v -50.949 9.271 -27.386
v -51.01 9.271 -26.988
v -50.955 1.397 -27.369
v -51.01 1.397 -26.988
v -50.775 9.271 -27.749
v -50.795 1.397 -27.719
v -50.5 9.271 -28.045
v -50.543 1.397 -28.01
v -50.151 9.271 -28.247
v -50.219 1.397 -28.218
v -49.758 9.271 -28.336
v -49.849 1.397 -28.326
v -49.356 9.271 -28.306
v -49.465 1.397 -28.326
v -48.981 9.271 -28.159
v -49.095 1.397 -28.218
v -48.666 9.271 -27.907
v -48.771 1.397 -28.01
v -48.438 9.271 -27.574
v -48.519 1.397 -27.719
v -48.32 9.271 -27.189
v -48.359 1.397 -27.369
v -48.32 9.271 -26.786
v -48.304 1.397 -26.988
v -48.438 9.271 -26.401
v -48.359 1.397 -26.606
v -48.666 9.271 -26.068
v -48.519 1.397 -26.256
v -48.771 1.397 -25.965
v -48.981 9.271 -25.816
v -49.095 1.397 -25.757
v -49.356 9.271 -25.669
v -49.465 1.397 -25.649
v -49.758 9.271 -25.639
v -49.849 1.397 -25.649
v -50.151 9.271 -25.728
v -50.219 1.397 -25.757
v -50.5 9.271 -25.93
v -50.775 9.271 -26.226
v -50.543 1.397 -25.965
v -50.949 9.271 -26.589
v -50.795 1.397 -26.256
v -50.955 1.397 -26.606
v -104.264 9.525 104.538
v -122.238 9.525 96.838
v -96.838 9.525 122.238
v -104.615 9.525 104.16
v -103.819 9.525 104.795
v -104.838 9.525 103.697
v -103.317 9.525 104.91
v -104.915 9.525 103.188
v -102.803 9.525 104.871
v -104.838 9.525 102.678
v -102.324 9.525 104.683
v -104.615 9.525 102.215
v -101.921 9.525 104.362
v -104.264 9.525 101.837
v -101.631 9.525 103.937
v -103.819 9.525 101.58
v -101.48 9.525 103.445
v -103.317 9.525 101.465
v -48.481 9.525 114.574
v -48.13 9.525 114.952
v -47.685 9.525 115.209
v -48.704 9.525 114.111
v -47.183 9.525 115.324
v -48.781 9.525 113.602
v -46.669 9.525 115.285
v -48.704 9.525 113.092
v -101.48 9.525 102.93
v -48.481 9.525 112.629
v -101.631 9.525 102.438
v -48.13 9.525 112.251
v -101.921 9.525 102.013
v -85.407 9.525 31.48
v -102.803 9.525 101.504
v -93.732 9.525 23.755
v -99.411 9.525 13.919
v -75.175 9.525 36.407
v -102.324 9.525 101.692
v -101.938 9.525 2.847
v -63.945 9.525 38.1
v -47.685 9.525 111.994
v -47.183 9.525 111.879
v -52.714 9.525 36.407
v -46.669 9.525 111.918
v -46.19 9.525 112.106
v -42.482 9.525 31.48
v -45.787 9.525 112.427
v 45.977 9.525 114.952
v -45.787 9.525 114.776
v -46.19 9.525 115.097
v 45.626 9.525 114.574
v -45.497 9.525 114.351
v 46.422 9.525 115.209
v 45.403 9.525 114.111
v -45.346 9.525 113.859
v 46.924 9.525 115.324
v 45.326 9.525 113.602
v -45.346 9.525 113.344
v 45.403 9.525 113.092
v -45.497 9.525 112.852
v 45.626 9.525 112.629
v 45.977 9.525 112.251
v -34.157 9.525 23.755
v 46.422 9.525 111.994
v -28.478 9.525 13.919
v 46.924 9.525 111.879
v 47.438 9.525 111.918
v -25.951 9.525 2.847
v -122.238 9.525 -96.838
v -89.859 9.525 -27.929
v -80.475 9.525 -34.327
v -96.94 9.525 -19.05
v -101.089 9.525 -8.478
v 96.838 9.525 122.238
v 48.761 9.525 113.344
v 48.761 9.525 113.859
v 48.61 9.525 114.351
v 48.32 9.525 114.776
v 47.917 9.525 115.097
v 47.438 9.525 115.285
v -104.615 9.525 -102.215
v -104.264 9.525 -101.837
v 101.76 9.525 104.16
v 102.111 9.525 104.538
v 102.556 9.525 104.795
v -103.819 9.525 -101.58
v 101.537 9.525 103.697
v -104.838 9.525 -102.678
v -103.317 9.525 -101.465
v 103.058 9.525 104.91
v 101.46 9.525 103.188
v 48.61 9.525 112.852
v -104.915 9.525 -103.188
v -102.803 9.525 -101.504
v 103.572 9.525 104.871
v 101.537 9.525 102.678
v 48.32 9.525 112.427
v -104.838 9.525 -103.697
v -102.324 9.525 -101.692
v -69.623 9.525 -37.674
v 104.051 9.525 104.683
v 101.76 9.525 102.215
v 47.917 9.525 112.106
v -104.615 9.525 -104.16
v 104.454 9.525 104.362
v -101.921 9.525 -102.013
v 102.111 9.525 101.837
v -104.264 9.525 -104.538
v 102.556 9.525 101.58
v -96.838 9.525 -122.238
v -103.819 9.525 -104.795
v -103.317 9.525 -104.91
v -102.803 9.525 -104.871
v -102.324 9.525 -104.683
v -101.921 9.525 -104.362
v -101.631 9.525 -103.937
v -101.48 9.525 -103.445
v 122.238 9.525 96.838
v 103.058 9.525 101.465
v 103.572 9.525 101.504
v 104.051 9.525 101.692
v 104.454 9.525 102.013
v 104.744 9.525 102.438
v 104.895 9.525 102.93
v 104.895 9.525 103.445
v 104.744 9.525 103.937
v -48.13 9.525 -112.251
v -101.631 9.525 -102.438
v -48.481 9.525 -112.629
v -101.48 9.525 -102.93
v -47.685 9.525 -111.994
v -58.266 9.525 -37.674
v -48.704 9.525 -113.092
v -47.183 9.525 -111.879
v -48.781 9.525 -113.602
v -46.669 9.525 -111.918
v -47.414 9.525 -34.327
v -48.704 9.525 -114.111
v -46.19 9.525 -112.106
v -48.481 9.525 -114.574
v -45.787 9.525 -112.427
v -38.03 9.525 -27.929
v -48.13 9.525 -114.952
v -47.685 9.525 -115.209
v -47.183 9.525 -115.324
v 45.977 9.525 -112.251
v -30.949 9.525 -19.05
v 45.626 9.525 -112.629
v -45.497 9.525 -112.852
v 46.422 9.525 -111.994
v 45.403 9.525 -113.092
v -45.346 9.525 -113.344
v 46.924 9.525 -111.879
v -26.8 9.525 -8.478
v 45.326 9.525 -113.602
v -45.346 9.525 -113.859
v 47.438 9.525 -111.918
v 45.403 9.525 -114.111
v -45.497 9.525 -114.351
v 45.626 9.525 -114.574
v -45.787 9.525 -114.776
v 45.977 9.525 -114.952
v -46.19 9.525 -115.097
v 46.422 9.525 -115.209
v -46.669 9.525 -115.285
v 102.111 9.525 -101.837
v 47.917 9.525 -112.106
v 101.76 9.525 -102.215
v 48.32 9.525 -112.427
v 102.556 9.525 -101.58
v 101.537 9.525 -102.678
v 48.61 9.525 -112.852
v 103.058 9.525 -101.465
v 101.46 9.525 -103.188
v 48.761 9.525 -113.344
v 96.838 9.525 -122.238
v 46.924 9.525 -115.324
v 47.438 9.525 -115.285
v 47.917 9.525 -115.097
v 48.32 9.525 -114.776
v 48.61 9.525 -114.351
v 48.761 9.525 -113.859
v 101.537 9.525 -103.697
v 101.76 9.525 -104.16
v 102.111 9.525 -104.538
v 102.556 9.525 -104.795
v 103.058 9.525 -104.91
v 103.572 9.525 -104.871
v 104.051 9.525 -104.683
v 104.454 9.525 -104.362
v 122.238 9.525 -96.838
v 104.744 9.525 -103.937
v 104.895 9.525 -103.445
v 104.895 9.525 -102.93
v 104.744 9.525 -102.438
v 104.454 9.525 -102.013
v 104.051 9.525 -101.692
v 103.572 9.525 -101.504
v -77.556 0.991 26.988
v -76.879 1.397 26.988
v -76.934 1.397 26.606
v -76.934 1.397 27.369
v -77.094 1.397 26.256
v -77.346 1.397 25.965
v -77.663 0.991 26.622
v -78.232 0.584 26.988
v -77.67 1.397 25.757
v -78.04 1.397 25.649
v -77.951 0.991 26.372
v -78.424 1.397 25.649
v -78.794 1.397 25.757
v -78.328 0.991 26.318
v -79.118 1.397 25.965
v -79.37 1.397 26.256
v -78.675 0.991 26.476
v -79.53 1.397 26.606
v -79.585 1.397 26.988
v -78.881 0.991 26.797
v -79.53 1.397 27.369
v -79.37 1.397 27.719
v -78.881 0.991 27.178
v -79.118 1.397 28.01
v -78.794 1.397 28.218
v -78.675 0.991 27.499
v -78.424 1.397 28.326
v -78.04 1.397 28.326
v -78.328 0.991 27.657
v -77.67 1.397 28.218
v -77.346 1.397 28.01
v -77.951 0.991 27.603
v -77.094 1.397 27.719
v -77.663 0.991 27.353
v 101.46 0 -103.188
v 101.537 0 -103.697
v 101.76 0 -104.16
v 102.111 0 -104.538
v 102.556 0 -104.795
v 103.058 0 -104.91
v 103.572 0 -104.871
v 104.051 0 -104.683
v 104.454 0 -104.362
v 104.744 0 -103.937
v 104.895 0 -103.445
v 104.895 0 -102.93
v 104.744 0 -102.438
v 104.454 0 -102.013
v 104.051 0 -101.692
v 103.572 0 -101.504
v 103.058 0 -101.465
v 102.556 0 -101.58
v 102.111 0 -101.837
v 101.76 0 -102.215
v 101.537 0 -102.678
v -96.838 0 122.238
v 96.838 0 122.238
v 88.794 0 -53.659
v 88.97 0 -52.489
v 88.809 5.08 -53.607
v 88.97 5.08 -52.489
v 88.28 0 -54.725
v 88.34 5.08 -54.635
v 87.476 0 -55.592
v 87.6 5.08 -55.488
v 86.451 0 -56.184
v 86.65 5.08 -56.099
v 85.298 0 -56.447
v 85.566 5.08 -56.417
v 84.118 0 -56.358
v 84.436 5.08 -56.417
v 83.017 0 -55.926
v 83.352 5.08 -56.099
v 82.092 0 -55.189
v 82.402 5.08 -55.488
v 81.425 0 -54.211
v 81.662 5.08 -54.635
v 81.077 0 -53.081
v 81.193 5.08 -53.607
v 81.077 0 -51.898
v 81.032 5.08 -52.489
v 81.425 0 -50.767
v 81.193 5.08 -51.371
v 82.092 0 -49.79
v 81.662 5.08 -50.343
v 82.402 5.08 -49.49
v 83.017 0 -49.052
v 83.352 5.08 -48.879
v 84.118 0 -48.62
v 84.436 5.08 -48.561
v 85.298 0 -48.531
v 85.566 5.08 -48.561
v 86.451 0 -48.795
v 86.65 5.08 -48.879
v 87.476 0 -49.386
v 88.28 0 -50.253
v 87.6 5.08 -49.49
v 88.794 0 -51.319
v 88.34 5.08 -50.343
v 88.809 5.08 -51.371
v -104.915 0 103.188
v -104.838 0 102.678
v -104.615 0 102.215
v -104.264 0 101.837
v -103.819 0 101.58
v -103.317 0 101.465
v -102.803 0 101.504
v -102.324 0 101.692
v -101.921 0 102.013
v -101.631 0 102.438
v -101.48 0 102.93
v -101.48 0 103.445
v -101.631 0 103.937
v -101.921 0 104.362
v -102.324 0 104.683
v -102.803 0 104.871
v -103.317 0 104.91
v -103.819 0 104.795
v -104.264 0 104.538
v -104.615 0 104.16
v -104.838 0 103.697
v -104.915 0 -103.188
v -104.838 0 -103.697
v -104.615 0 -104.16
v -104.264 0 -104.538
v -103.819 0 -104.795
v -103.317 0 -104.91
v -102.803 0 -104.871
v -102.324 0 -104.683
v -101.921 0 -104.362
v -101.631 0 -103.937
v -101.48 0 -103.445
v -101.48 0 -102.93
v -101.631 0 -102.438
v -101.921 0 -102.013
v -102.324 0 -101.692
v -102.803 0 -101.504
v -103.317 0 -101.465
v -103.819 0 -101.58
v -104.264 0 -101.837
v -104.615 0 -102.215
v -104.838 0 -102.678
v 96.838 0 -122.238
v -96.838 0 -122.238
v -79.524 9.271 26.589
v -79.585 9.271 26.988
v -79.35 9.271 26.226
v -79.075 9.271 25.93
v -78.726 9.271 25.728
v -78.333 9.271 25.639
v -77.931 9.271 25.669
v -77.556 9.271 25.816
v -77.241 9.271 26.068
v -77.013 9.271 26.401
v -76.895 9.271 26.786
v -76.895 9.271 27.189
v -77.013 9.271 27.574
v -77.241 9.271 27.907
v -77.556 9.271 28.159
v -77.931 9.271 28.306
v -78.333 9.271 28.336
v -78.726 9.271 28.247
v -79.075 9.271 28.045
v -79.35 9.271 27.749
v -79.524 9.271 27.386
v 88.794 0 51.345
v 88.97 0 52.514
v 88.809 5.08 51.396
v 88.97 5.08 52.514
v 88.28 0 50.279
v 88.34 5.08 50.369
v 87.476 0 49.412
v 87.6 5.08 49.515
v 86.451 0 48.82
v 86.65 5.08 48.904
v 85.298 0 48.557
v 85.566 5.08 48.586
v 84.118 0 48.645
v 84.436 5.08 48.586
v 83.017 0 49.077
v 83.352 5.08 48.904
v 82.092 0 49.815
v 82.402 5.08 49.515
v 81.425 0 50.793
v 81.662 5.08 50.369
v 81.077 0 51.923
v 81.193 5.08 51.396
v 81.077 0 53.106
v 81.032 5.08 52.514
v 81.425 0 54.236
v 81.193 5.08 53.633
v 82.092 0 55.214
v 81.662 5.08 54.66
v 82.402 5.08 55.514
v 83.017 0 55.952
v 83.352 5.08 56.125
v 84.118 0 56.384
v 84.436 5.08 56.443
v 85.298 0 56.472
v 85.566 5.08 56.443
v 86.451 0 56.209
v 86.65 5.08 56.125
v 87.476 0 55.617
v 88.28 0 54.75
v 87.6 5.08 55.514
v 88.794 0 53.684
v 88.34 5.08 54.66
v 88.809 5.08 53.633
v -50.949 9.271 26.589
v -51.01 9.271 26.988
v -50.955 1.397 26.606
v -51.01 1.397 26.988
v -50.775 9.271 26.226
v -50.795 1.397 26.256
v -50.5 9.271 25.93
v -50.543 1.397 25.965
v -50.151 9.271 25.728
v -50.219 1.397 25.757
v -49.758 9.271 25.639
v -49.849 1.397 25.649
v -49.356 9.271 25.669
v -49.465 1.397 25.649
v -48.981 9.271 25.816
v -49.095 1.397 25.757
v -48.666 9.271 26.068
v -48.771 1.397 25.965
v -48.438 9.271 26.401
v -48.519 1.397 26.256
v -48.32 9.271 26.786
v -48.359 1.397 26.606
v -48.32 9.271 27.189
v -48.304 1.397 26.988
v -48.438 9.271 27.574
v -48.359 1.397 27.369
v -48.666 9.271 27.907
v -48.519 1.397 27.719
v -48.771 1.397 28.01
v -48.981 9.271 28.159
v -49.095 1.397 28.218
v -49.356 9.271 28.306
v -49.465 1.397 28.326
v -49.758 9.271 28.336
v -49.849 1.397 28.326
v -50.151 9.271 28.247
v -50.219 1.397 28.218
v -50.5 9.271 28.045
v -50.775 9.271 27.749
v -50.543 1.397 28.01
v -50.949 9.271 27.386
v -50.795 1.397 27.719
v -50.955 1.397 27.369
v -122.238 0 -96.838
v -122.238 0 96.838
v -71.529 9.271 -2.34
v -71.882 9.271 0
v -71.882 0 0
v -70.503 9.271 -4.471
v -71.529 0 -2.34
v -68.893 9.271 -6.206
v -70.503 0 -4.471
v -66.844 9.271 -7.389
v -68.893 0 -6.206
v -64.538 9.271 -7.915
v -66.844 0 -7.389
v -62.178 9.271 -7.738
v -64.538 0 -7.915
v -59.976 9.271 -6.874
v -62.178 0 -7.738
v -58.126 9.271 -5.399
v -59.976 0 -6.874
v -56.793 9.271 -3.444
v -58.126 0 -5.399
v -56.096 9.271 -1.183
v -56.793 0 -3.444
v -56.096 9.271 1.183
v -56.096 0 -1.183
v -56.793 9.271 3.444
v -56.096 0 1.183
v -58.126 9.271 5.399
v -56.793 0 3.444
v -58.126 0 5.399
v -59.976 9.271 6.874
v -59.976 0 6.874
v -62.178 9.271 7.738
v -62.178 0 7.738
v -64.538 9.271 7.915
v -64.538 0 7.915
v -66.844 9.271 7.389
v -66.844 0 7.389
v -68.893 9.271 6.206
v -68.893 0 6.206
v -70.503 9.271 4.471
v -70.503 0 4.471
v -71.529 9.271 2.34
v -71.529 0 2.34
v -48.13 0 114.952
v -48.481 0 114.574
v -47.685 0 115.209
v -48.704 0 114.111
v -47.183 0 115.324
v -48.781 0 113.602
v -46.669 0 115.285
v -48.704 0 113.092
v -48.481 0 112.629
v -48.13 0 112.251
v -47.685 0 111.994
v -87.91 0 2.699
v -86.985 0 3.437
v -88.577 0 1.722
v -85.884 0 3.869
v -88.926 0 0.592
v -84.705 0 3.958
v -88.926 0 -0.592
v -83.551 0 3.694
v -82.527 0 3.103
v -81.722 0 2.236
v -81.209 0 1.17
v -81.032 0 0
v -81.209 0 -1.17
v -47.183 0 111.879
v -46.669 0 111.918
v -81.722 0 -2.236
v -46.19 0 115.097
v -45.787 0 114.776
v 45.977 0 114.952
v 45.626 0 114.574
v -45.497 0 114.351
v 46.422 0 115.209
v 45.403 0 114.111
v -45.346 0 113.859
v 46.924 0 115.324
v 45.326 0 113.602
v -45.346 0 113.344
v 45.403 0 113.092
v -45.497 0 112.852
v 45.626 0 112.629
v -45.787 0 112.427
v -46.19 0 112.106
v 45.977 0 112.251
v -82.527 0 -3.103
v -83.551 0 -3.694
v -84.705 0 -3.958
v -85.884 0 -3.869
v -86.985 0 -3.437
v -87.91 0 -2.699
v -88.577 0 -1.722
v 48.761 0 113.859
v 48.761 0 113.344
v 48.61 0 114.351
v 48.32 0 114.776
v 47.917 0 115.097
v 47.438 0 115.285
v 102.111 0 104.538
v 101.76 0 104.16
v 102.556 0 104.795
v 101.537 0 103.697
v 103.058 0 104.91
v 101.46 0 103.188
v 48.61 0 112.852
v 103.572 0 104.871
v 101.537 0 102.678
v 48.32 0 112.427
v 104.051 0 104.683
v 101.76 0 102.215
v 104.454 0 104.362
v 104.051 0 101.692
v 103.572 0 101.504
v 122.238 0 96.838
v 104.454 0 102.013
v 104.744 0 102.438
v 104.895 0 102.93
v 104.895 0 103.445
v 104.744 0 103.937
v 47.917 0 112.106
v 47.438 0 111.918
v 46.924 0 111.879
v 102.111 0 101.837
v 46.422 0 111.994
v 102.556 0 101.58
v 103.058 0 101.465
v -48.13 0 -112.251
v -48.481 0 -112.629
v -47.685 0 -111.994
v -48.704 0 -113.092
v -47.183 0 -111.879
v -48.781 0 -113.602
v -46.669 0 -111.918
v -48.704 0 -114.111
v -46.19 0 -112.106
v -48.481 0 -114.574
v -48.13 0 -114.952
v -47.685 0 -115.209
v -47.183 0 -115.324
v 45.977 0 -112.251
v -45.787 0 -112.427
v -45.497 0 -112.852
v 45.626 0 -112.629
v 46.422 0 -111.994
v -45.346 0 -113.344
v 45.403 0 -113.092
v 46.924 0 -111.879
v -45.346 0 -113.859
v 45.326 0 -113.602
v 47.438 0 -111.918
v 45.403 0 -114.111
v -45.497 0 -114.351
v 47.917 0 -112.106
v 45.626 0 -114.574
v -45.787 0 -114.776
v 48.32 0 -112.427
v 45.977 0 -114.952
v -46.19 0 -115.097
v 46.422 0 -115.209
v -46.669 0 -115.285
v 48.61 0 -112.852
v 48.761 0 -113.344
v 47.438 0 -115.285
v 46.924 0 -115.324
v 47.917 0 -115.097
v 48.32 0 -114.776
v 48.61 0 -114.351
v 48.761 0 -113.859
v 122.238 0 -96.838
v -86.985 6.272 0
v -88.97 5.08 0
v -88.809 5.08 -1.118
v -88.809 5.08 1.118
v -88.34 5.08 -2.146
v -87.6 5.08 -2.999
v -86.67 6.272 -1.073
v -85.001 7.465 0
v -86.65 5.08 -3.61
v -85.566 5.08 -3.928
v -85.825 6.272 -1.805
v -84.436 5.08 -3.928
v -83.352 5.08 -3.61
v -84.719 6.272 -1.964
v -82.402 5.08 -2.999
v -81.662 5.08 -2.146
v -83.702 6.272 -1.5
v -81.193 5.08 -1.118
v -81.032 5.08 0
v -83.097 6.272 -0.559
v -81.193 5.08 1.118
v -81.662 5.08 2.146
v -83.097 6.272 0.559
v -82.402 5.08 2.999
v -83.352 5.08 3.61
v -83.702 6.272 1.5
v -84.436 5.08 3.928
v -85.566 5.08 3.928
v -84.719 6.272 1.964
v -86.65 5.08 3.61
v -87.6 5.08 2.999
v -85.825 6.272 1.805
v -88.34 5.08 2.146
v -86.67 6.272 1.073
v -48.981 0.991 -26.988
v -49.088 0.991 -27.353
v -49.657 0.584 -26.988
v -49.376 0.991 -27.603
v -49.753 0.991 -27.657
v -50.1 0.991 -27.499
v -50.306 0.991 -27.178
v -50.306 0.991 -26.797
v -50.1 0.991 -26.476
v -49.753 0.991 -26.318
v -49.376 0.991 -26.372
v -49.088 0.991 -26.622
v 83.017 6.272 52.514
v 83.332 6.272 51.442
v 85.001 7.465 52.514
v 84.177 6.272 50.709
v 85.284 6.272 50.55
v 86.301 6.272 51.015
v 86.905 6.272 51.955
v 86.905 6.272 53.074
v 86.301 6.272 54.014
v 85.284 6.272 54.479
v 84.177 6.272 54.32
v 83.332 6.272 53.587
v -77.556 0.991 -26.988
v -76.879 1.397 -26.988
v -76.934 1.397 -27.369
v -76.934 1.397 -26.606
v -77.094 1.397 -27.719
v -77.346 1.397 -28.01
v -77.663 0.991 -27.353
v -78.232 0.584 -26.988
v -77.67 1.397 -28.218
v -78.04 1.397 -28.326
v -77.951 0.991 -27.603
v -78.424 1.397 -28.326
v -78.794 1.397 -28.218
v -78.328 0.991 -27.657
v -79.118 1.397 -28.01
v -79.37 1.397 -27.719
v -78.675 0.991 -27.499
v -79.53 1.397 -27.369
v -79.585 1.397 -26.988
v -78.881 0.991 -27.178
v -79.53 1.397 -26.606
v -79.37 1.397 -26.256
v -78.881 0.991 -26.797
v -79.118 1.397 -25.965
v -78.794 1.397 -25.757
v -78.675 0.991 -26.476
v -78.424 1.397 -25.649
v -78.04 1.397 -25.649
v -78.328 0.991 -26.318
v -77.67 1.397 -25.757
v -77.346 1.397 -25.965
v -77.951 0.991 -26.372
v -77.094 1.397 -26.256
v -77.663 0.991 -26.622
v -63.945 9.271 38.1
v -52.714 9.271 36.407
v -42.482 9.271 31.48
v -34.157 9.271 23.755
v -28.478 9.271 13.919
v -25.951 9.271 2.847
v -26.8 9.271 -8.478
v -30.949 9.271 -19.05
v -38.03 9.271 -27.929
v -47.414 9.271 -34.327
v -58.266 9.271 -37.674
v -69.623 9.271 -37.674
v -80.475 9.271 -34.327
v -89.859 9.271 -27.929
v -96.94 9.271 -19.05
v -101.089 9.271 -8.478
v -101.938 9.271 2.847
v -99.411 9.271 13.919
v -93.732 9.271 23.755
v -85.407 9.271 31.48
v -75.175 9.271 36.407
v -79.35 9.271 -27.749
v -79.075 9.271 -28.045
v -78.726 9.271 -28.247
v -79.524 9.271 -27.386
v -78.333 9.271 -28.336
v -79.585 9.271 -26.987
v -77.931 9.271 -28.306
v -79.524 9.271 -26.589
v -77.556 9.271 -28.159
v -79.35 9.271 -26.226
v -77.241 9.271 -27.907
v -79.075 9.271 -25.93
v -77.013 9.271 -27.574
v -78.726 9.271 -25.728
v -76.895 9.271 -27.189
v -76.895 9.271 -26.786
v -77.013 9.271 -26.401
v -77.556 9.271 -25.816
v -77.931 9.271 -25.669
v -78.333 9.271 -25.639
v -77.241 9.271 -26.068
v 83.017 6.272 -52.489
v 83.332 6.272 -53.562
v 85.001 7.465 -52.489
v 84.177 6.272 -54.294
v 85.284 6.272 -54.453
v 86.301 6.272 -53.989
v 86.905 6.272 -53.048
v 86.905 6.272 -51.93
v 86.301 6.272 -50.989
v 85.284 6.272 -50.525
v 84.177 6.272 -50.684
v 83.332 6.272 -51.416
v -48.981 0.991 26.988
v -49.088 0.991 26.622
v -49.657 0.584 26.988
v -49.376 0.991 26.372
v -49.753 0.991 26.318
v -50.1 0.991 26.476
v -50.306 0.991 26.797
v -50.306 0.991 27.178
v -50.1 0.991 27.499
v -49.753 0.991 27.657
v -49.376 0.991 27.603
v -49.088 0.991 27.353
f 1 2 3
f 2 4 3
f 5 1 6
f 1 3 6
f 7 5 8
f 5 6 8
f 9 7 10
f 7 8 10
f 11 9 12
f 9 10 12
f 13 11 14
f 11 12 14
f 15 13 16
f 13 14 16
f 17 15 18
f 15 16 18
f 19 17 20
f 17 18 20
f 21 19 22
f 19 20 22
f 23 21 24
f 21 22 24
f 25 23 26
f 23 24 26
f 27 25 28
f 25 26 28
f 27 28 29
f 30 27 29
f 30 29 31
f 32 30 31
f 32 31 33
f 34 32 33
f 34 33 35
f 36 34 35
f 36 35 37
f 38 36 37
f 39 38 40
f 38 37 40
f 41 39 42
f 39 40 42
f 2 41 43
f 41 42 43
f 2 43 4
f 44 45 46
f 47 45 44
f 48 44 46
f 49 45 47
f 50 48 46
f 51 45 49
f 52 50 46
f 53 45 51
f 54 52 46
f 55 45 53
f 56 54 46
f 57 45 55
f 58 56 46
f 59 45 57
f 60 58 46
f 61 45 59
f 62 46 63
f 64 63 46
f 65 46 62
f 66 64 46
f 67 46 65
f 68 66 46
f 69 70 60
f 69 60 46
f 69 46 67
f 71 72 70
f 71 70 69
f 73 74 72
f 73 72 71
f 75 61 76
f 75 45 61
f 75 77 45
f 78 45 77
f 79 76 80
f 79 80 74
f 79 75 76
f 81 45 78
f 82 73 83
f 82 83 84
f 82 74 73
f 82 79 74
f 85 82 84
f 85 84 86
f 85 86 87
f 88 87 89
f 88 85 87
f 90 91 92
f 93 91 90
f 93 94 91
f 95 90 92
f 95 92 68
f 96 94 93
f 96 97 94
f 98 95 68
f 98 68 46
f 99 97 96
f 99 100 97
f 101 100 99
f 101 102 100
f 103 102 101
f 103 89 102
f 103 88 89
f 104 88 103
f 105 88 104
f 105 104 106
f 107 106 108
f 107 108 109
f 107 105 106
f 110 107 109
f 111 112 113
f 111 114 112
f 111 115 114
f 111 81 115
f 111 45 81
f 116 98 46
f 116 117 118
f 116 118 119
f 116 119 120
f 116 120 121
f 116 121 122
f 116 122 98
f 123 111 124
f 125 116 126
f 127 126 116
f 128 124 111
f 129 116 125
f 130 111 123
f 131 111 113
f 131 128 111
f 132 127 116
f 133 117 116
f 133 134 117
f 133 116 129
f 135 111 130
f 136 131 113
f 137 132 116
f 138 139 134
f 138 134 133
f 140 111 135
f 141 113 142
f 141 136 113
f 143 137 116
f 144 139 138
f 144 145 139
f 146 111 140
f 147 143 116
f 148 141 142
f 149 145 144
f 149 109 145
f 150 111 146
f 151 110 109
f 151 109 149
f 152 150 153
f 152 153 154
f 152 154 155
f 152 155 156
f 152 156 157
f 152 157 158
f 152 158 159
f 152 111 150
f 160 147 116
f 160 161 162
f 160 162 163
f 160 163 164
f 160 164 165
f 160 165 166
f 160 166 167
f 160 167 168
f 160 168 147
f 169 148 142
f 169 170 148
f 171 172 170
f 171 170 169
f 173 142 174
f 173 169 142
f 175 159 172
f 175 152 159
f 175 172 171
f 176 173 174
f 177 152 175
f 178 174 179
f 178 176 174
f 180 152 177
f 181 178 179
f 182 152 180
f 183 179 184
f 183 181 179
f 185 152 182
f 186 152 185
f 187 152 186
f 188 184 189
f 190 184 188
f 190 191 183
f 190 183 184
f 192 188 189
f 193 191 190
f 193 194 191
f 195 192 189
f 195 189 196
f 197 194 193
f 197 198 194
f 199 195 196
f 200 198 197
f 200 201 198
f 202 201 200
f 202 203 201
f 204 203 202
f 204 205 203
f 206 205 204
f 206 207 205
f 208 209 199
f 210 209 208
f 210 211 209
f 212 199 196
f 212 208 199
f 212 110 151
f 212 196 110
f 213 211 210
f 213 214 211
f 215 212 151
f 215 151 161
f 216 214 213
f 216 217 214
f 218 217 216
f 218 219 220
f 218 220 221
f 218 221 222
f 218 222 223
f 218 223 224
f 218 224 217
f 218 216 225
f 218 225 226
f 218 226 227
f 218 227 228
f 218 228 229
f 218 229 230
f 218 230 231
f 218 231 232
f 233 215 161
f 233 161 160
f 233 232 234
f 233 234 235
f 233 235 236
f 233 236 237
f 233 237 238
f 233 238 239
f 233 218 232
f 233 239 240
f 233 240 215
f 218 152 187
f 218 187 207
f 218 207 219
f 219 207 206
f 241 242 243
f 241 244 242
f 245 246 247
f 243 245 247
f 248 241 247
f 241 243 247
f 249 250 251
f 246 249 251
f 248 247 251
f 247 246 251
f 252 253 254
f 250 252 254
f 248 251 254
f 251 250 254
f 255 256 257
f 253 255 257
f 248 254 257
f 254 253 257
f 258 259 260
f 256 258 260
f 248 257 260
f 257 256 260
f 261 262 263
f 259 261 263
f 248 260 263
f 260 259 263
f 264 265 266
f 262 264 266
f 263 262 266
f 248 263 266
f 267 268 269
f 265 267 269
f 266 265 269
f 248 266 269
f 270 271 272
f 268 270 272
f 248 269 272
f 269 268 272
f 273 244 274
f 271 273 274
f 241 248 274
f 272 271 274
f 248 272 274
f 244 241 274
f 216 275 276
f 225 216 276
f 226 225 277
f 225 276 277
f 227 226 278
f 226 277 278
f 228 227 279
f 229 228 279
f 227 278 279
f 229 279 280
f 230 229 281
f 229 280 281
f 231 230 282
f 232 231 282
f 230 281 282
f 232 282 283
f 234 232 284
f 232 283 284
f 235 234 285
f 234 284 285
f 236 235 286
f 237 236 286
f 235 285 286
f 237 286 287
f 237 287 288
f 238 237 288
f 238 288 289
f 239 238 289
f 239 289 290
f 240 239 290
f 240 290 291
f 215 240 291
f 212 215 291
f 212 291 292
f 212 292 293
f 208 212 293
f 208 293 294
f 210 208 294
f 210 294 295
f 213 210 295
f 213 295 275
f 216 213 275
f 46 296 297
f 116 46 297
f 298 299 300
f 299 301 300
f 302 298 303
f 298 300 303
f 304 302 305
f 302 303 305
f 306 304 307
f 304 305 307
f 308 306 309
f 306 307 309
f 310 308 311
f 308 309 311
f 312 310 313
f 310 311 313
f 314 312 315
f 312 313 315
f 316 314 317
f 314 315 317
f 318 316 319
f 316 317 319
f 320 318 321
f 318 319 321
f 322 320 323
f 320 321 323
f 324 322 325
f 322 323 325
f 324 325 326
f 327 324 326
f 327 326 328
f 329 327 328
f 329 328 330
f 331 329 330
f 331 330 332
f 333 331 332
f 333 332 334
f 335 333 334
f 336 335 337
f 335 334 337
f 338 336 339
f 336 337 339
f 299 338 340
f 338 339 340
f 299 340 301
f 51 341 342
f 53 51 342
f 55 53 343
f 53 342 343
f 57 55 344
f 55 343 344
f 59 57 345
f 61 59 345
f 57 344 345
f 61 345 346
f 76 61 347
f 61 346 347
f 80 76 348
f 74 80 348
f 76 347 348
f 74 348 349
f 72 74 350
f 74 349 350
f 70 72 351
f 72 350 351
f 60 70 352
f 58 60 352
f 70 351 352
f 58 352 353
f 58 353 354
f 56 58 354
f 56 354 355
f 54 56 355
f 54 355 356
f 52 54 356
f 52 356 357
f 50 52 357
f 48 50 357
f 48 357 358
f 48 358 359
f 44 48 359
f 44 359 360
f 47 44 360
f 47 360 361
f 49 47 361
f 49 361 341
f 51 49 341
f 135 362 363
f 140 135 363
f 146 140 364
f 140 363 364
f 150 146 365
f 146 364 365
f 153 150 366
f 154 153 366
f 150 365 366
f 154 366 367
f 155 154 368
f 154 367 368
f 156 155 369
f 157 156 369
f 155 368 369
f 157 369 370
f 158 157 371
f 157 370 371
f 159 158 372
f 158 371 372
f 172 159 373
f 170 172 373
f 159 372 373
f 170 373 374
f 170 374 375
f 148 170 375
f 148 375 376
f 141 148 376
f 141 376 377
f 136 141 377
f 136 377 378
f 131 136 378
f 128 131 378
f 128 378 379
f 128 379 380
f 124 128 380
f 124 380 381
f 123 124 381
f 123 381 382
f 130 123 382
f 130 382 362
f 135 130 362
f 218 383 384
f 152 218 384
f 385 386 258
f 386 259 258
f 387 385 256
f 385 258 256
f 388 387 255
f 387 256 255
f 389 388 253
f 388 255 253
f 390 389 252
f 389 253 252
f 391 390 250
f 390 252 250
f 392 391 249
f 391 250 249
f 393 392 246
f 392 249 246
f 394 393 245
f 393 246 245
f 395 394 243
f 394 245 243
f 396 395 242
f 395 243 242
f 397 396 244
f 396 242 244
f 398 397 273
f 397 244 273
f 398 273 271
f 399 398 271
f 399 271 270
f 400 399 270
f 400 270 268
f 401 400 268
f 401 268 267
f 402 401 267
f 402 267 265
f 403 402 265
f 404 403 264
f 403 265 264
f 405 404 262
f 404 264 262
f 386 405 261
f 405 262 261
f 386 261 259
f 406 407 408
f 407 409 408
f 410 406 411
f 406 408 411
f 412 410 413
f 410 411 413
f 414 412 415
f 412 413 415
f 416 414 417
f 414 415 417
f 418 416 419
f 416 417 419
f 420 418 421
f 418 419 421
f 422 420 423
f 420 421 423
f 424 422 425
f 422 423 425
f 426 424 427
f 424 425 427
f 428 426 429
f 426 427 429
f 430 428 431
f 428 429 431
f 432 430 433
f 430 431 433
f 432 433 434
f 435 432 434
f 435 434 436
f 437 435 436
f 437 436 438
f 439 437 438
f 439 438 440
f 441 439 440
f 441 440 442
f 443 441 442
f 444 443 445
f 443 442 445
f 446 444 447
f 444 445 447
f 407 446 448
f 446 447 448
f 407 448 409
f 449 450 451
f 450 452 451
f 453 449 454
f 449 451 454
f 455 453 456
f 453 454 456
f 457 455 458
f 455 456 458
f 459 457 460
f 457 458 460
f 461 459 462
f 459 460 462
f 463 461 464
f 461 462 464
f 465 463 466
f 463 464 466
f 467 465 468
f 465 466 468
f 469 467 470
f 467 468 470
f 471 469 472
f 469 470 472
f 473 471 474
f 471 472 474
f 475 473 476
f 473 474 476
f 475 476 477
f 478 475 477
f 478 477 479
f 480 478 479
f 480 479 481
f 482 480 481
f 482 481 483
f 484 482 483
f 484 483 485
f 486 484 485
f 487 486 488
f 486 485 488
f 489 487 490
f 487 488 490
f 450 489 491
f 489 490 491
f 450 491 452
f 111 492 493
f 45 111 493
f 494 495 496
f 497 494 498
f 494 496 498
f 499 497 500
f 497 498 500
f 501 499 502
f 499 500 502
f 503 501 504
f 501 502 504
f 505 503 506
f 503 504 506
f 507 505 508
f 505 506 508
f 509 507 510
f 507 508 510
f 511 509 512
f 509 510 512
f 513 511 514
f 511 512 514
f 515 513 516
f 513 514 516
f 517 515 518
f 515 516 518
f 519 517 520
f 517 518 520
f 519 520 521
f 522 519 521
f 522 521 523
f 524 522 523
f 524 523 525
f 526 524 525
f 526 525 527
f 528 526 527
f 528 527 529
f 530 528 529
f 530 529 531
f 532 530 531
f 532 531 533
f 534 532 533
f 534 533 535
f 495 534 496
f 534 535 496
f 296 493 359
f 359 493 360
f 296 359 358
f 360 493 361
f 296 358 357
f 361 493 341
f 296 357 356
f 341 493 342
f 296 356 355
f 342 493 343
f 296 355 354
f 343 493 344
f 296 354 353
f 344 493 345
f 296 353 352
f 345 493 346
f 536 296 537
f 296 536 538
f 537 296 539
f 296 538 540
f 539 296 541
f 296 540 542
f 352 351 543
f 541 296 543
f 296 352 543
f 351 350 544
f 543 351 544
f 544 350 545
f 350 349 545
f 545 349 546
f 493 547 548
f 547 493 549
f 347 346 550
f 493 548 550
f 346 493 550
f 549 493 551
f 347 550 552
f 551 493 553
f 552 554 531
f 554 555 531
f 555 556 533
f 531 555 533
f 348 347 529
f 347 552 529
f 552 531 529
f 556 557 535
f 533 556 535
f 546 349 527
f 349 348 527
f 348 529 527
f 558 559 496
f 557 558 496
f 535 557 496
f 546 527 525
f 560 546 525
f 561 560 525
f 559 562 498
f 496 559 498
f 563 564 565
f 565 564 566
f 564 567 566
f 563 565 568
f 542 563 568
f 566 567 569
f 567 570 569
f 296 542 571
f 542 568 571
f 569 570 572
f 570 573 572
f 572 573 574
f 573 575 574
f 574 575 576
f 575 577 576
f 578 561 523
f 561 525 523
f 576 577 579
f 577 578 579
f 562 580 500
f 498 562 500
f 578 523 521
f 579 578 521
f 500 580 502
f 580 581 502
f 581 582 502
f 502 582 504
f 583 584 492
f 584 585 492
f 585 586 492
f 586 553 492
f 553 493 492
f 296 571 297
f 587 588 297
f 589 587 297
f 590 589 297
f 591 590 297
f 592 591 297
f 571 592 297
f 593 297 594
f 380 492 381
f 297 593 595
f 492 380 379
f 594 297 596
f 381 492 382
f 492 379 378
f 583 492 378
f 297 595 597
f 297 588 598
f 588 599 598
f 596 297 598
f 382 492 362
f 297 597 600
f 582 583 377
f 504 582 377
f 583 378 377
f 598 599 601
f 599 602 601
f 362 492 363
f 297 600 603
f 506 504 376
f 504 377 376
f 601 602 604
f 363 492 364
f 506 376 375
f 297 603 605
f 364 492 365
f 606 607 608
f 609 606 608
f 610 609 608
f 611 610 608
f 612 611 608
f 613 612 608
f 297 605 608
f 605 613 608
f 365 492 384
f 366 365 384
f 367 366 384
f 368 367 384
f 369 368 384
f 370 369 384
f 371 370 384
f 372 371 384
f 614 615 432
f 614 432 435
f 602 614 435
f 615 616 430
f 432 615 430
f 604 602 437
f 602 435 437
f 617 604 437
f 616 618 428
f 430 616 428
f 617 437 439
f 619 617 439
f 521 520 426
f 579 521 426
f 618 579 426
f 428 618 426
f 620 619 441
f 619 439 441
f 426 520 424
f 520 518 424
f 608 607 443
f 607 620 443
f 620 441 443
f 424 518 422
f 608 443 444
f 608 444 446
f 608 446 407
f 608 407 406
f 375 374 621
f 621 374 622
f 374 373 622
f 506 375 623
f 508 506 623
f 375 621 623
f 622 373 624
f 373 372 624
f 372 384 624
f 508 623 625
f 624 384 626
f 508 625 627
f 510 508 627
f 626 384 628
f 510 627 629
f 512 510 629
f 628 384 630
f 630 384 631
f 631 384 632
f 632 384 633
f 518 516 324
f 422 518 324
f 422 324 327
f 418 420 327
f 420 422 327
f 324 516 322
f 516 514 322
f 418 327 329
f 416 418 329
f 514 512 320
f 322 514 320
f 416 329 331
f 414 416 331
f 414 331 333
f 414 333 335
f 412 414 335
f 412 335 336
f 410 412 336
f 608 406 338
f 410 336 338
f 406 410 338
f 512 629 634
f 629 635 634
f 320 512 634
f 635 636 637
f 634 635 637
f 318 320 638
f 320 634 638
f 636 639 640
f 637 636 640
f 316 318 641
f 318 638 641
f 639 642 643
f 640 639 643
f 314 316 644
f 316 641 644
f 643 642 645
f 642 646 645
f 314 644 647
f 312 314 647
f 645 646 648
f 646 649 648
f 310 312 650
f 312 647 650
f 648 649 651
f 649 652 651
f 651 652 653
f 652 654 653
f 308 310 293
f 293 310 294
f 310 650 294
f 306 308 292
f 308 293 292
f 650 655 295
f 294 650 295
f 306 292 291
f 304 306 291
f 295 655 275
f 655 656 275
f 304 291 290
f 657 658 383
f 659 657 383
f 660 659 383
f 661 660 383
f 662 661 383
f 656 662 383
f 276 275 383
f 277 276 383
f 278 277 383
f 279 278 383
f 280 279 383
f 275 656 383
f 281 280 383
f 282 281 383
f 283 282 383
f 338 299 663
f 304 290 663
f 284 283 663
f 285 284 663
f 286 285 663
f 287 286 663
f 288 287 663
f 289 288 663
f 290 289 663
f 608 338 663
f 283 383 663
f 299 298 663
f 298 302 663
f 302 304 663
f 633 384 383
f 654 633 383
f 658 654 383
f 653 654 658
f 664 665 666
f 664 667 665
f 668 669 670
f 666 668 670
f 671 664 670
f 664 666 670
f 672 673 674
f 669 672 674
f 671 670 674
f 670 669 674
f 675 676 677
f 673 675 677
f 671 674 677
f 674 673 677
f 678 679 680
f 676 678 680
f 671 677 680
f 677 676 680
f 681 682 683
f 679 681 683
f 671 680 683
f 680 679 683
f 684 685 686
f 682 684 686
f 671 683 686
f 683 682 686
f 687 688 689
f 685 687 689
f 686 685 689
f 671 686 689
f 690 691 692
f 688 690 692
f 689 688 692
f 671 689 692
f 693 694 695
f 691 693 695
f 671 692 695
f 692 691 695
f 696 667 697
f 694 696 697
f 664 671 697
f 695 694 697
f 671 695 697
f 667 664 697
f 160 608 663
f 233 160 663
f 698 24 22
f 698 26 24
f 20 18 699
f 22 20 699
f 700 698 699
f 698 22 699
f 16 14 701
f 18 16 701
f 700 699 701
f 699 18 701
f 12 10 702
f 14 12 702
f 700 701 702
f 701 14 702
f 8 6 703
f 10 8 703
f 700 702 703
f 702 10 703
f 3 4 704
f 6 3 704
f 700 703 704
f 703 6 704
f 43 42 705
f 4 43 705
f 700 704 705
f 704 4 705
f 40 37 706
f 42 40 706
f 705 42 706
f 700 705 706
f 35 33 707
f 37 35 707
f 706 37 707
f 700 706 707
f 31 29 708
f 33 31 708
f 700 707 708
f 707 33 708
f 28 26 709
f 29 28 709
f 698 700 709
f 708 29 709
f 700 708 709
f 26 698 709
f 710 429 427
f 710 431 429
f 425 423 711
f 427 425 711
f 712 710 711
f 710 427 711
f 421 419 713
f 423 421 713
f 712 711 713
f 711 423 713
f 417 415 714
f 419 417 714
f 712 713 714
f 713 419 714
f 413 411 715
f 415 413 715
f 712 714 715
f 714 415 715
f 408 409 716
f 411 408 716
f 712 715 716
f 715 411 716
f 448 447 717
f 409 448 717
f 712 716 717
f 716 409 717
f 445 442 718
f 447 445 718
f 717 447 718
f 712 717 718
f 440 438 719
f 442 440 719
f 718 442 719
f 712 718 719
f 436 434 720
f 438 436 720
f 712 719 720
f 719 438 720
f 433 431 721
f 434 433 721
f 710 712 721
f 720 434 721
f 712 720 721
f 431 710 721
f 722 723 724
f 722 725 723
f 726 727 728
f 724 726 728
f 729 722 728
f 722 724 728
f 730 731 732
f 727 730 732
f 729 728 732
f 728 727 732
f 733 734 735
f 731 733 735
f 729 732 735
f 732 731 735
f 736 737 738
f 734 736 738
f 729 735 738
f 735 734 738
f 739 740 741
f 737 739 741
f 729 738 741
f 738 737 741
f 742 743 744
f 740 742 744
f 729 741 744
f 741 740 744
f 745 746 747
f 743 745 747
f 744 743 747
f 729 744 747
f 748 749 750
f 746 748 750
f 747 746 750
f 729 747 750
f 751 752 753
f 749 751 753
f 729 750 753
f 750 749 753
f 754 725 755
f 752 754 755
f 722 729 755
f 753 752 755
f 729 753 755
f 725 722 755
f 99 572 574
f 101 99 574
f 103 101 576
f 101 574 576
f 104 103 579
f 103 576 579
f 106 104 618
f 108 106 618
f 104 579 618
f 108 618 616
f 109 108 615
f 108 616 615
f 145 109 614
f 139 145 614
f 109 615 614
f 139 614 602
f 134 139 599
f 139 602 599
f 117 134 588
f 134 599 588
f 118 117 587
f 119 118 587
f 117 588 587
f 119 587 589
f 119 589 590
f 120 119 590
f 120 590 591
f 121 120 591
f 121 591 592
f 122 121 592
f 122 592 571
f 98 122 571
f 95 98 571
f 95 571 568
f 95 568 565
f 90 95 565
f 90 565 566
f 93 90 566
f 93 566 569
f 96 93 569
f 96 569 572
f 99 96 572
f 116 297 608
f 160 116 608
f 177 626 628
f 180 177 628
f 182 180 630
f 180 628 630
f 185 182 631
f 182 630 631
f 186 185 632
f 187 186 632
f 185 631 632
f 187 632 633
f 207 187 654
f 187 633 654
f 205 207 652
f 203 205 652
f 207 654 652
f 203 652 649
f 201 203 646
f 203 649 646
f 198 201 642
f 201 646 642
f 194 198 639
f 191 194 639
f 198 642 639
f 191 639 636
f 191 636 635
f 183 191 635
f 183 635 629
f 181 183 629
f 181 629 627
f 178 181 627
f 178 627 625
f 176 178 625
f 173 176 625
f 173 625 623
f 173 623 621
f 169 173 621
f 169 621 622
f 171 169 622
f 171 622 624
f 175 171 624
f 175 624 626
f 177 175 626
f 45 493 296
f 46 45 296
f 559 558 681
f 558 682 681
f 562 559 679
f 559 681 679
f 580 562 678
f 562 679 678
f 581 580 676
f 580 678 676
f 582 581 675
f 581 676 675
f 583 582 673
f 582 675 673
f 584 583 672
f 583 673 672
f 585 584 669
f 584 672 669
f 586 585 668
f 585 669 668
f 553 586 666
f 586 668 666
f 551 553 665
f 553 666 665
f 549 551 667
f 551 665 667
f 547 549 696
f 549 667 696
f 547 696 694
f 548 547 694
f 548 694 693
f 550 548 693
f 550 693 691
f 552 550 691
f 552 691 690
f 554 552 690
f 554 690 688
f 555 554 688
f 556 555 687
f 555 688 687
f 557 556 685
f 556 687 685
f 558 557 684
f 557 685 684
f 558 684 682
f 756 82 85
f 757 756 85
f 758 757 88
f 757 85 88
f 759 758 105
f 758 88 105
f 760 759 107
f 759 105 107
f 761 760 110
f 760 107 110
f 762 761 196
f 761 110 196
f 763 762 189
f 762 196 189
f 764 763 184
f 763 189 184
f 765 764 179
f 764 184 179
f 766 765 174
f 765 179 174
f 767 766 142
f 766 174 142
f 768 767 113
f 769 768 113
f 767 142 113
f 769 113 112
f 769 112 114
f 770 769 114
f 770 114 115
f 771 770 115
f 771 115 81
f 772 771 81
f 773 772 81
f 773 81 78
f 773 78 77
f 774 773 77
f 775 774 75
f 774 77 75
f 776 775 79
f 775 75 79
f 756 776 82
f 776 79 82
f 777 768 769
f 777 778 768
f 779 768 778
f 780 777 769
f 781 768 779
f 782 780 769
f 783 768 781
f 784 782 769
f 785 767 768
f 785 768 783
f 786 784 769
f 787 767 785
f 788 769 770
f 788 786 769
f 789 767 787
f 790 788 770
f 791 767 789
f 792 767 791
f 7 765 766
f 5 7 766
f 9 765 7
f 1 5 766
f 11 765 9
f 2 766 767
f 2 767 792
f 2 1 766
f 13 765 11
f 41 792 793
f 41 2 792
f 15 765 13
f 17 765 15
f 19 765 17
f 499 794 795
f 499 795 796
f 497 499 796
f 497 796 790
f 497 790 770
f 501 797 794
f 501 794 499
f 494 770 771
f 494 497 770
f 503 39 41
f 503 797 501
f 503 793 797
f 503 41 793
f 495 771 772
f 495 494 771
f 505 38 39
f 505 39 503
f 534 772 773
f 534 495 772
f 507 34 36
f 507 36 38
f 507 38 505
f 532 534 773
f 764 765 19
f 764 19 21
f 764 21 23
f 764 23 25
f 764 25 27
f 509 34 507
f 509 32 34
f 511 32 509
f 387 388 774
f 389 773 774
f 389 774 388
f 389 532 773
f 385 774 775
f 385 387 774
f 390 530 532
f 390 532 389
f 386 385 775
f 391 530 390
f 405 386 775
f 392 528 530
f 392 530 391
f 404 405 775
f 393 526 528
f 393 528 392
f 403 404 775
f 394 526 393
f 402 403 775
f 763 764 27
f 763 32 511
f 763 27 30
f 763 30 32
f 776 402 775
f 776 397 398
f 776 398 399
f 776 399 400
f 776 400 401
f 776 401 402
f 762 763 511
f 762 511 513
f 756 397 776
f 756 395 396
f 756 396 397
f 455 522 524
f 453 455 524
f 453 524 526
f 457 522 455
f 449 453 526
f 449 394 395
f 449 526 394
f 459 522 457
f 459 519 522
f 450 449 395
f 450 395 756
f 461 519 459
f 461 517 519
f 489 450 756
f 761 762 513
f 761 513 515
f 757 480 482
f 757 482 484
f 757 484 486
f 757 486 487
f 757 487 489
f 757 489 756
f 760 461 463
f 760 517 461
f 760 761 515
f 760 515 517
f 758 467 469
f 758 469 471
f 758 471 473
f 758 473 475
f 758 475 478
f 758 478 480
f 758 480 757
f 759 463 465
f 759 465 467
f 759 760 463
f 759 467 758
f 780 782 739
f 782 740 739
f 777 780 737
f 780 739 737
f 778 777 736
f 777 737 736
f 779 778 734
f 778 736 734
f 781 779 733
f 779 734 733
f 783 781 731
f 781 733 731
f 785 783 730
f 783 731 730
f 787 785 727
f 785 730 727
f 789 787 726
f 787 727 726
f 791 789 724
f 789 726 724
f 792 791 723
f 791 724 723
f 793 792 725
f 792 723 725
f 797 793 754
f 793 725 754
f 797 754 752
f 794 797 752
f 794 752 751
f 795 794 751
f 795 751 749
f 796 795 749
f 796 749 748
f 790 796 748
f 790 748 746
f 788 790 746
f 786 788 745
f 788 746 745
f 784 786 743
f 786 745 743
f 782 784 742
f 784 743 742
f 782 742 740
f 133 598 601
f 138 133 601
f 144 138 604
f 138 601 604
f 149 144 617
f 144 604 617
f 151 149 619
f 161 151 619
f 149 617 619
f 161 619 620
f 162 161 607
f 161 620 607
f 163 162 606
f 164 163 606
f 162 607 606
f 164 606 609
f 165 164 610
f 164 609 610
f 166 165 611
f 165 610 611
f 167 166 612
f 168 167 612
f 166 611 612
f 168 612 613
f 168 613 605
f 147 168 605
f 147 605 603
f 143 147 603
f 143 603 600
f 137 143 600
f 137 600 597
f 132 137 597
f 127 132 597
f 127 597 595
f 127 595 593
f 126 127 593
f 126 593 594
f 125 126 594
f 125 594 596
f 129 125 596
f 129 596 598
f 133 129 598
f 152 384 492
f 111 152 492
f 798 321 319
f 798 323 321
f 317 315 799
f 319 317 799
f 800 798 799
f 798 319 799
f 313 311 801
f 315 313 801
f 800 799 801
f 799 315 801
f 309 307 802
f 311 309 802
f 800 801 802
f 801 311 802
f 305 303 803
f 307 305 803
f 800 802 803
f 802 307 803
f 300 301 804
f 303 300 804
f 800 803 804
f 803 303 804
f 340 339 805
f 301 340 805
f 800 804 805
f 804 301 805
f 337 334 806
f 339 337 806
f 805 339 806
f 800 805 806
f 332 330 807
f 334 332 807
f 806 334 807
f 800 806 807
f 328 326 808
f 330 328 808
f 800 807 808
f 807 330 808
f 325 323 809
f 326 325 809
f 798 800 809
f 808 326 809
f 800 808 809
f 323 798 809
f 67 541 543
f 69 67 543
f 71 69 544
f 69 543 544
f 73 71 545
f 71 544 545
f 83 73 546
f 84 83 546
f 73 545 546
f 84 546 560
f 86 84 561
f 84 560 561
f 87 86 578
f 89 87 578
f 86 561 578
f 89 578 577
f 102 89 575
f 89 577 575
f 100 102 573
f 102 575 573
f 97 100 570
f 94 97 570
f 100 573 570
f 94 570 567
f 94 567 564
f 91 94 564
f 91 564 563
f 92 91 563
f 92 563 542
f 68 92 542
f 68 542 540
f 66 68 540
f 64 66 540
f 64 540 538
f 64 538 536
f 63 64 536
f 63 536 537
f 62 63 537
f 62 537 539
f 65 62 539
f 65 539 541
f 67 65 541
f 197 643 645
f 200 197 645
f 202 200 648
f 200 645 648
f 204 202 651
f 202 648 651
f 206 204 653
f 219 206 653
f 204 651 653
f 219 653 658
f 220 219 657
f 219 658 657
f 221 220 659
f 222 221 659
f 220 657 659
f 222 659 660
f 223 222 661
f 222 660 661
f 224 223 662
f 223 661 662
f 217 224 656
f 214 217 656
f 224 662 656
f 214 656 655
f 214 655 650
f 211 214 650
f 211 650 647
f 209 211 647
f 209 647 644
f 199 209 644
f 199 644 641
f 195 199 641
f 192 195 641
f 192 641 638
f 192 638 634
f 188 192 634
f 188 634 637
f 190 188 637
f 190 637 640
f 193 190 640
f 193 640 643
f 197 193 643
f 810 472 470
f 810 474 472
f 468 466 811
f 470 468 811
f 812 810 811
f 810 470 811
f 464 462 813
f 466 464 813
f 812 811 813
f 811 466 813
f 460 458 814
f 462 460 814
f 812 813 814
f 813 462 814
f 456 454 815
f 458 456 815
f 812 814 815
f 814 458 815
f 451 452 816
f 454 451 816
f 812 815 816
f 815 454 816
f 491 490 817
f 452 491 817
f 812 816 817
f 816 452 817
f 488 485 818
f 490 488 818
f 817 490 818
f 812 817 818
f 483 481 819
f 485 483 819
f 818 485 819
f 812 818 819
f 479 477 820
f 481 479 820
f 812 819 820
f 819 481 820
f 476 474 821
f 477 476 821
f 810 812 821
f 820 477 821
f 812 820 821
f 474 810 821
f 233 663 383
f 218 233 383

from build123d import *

# Parameters (mm, degrees)
BOSS_EXTRUDE1_DEPTH                = 9.525
F_8_32_TAPPED_HOLE1_D              = 3.4544
F_5_8_0_625_DIAMETER_HOLE1_D       = 15.875
F_6_32_TAPPED_HOLE1_D              = 2.7051
F_6_32_TAPPED_HOLE1_DEPTH          = 8.128
F_6_32_TAPPED_HOLE1_TIP            = 0.81269403
SKETCH8_R                          = 38.1
SKETCH8_R_2                        = 1.35255
SKETCH8_R_3                        = 7.9375
CUT_EXTRUDE1_DEPTH                 = 0.254
F_8_32_TAPPED_HOLE2_D              = 3.4544
F_5_16_0_3125_DIAMETER_HOLE1_D     = 7.9375
F_5_16_0_3125_DIAMETER_HOLE1_DEPTH = 5.08
F_5_16_0_3125_DIAMETER_HOLE1_TIP   = 2.384665582


with BuildPart() as part:
    # Sketch1 → Boss-Extrude1 (new body)
    with BuildSketch(Plane(origin=(0, 0, 0), x_dir=(1, 0, 0), z_dir=(0, 1, 0))):
        Polygon((-96.8375, 122.2375), (-122.2375, 96.8375), (-122.2375, -96.8375), (-96.8375, -122.2375), (96.8375, -122.2375), (122.2375, -96.8375), (122.2375, 96.8375), (96.8375, 122.2375), align=None)
    extrude(amount=BOSS_EXTRUDE1_DEPTH)

    # #8-32 Tapped Hole1 (through all)
    with Locations(Plane(origin=(0, 9.525, 0), x_dir=(1, 0, 0), z_dir=(0, 1, 0))):
        with Locations((-47.0535, 113.6015), (47.0535, 113.6015), (47.0535, -113.6015), (-47.0535, -113.6015)):
            Hole(F_8_32_TAPPED_HOLE1_D / 2)

    # 5/8 (0.625) Diameter Hole1 (through all)
    with Locations(Plane(origin=(0, 9.525, 0), x_dir=(1, 0, 0), z_dir=(0, 1, 0))):
        with Locations((-63.9445, 0)):
            Hole(F_5_8_0_625_DIAMETER_HOLE1_D / 2)

    # #6-32 Tapped Hole1
    with Locations(Plane(origin=(0, 9.525, 0), x_dir=(1, 0, 0), z_dir=(0, 1, 0))):
        with Locations((-78.232, -26.9875), (-49.657, -26.9875), (-49.657, 26.9875), (-78.232, 26.9875)):
            Hole(F_6_32_TAPPED_HOLE1_D / 2, depth=F_6_32_TAPPED_HOLE1_DEPTH)
            with Locations((0, 0, -(F_6_32_TAPPED_HOLE1_DEPTH + F_6_32_TAPPED_HOLE1_TIP / 2))):  # 118° drill point
                Cone(0, F_6_32_TAPPED_HOLE1_D / 2, F_6_32_TAPPED_HOLE1_TIP, mode=Mode.SUBTRACT)

    # Sketch8 → Cut-Extrude1 (cut)
    with BuildSketch(Plane(origin=(0, 9.525, 0), x_dir=(1, 0, 0), z_dir=(0, 1, 0))):
        with Locations(Location((-63.9445, 0, 0), (0, 0, 270))):  # turned: the seam where the file's is
            Circle(SKETCH8_R)
        with Locations(Location((-78.232, -26.9875, 0), (0, 0, 270))):  # turned: the seam where the file's is
            Circle(SKETCH8_R_2, mode=Mode.SUBTRACT)
        with Locations(Location((-49.657, 26.9875, 0), (0, 0, 270))):  # turned: the seam where the file's is
            Circle(SKETCH8_R_2, mode=Mode.SUBTRACT)
        with Locations(Location((-63.9445, 0, 0), (0, 0, 270))):  # turned: the seam where the file's is
            Circle(SKETCH8_R_3, mode=Mode.SUBTRACT)
        with Locations(Location((-78.232, 26.9875, 0), (0, 0, 270))):  # turned: the seam where the file's is
            Circle(SKETCH8_R_2, mode=Mode.SUBTRACT)
        with Locations(Location((-49.657, -26.9875, 0), (0, 0, 270))):  # turned: the seam where the file's is
            Circle(SKETCH8_R_2, mode=Mode.SUBTRACT)
    extrude(amount=-CUT_EXTRUDE1_DEPTH, mode=Mode.SUBTRACT)

    # #8-32 Tapped Hole2 (through all)
    with Locations(Plane(origin=(0, 9.525, 0), x_dir=(1, 0, 0), z_dir=(0, 1, 0))):
        with Locations((-103.1875, 103.1875), (103.1875, 103.1875), (103.1875, -103.1875), (-103.1875, -103.1875)):
            Hole(F_8_32_TAPPED_HOLE2_D / 2)

    # 5/16 (0.3125) Diameter Hole1
    with Locations(Plane(origin=(0, 0, 0), x_dir=(-1, 0, 0), z_dir=(0, -1, 0))):
        with Locations((85.0011, 0), (-85.0011, -52.5145), (-85.0011, 52.4891)):
            Hole(F_5_16_0_3125_DIAMETER_HOLE1_D / 2, depth=F_5_16_0_3125_DIAMETER_HOLE1_DEPTH)
            with Locations((0, 0, -(F_5_16_0_3125_DIAMETER_HOLE1_DEPTH + F_5_16_0_3125_DIAMETER_HOLE1_TIP / 2))):  # 118° drill point
                Cone(0, F_5_16_0_3125_DIAMETER_HOLE1_D / 2, F_5_16_0_3125_DIAMETER_HOLE1_TIP, mode=Mode.SUBTRACT)


solid = part.part
